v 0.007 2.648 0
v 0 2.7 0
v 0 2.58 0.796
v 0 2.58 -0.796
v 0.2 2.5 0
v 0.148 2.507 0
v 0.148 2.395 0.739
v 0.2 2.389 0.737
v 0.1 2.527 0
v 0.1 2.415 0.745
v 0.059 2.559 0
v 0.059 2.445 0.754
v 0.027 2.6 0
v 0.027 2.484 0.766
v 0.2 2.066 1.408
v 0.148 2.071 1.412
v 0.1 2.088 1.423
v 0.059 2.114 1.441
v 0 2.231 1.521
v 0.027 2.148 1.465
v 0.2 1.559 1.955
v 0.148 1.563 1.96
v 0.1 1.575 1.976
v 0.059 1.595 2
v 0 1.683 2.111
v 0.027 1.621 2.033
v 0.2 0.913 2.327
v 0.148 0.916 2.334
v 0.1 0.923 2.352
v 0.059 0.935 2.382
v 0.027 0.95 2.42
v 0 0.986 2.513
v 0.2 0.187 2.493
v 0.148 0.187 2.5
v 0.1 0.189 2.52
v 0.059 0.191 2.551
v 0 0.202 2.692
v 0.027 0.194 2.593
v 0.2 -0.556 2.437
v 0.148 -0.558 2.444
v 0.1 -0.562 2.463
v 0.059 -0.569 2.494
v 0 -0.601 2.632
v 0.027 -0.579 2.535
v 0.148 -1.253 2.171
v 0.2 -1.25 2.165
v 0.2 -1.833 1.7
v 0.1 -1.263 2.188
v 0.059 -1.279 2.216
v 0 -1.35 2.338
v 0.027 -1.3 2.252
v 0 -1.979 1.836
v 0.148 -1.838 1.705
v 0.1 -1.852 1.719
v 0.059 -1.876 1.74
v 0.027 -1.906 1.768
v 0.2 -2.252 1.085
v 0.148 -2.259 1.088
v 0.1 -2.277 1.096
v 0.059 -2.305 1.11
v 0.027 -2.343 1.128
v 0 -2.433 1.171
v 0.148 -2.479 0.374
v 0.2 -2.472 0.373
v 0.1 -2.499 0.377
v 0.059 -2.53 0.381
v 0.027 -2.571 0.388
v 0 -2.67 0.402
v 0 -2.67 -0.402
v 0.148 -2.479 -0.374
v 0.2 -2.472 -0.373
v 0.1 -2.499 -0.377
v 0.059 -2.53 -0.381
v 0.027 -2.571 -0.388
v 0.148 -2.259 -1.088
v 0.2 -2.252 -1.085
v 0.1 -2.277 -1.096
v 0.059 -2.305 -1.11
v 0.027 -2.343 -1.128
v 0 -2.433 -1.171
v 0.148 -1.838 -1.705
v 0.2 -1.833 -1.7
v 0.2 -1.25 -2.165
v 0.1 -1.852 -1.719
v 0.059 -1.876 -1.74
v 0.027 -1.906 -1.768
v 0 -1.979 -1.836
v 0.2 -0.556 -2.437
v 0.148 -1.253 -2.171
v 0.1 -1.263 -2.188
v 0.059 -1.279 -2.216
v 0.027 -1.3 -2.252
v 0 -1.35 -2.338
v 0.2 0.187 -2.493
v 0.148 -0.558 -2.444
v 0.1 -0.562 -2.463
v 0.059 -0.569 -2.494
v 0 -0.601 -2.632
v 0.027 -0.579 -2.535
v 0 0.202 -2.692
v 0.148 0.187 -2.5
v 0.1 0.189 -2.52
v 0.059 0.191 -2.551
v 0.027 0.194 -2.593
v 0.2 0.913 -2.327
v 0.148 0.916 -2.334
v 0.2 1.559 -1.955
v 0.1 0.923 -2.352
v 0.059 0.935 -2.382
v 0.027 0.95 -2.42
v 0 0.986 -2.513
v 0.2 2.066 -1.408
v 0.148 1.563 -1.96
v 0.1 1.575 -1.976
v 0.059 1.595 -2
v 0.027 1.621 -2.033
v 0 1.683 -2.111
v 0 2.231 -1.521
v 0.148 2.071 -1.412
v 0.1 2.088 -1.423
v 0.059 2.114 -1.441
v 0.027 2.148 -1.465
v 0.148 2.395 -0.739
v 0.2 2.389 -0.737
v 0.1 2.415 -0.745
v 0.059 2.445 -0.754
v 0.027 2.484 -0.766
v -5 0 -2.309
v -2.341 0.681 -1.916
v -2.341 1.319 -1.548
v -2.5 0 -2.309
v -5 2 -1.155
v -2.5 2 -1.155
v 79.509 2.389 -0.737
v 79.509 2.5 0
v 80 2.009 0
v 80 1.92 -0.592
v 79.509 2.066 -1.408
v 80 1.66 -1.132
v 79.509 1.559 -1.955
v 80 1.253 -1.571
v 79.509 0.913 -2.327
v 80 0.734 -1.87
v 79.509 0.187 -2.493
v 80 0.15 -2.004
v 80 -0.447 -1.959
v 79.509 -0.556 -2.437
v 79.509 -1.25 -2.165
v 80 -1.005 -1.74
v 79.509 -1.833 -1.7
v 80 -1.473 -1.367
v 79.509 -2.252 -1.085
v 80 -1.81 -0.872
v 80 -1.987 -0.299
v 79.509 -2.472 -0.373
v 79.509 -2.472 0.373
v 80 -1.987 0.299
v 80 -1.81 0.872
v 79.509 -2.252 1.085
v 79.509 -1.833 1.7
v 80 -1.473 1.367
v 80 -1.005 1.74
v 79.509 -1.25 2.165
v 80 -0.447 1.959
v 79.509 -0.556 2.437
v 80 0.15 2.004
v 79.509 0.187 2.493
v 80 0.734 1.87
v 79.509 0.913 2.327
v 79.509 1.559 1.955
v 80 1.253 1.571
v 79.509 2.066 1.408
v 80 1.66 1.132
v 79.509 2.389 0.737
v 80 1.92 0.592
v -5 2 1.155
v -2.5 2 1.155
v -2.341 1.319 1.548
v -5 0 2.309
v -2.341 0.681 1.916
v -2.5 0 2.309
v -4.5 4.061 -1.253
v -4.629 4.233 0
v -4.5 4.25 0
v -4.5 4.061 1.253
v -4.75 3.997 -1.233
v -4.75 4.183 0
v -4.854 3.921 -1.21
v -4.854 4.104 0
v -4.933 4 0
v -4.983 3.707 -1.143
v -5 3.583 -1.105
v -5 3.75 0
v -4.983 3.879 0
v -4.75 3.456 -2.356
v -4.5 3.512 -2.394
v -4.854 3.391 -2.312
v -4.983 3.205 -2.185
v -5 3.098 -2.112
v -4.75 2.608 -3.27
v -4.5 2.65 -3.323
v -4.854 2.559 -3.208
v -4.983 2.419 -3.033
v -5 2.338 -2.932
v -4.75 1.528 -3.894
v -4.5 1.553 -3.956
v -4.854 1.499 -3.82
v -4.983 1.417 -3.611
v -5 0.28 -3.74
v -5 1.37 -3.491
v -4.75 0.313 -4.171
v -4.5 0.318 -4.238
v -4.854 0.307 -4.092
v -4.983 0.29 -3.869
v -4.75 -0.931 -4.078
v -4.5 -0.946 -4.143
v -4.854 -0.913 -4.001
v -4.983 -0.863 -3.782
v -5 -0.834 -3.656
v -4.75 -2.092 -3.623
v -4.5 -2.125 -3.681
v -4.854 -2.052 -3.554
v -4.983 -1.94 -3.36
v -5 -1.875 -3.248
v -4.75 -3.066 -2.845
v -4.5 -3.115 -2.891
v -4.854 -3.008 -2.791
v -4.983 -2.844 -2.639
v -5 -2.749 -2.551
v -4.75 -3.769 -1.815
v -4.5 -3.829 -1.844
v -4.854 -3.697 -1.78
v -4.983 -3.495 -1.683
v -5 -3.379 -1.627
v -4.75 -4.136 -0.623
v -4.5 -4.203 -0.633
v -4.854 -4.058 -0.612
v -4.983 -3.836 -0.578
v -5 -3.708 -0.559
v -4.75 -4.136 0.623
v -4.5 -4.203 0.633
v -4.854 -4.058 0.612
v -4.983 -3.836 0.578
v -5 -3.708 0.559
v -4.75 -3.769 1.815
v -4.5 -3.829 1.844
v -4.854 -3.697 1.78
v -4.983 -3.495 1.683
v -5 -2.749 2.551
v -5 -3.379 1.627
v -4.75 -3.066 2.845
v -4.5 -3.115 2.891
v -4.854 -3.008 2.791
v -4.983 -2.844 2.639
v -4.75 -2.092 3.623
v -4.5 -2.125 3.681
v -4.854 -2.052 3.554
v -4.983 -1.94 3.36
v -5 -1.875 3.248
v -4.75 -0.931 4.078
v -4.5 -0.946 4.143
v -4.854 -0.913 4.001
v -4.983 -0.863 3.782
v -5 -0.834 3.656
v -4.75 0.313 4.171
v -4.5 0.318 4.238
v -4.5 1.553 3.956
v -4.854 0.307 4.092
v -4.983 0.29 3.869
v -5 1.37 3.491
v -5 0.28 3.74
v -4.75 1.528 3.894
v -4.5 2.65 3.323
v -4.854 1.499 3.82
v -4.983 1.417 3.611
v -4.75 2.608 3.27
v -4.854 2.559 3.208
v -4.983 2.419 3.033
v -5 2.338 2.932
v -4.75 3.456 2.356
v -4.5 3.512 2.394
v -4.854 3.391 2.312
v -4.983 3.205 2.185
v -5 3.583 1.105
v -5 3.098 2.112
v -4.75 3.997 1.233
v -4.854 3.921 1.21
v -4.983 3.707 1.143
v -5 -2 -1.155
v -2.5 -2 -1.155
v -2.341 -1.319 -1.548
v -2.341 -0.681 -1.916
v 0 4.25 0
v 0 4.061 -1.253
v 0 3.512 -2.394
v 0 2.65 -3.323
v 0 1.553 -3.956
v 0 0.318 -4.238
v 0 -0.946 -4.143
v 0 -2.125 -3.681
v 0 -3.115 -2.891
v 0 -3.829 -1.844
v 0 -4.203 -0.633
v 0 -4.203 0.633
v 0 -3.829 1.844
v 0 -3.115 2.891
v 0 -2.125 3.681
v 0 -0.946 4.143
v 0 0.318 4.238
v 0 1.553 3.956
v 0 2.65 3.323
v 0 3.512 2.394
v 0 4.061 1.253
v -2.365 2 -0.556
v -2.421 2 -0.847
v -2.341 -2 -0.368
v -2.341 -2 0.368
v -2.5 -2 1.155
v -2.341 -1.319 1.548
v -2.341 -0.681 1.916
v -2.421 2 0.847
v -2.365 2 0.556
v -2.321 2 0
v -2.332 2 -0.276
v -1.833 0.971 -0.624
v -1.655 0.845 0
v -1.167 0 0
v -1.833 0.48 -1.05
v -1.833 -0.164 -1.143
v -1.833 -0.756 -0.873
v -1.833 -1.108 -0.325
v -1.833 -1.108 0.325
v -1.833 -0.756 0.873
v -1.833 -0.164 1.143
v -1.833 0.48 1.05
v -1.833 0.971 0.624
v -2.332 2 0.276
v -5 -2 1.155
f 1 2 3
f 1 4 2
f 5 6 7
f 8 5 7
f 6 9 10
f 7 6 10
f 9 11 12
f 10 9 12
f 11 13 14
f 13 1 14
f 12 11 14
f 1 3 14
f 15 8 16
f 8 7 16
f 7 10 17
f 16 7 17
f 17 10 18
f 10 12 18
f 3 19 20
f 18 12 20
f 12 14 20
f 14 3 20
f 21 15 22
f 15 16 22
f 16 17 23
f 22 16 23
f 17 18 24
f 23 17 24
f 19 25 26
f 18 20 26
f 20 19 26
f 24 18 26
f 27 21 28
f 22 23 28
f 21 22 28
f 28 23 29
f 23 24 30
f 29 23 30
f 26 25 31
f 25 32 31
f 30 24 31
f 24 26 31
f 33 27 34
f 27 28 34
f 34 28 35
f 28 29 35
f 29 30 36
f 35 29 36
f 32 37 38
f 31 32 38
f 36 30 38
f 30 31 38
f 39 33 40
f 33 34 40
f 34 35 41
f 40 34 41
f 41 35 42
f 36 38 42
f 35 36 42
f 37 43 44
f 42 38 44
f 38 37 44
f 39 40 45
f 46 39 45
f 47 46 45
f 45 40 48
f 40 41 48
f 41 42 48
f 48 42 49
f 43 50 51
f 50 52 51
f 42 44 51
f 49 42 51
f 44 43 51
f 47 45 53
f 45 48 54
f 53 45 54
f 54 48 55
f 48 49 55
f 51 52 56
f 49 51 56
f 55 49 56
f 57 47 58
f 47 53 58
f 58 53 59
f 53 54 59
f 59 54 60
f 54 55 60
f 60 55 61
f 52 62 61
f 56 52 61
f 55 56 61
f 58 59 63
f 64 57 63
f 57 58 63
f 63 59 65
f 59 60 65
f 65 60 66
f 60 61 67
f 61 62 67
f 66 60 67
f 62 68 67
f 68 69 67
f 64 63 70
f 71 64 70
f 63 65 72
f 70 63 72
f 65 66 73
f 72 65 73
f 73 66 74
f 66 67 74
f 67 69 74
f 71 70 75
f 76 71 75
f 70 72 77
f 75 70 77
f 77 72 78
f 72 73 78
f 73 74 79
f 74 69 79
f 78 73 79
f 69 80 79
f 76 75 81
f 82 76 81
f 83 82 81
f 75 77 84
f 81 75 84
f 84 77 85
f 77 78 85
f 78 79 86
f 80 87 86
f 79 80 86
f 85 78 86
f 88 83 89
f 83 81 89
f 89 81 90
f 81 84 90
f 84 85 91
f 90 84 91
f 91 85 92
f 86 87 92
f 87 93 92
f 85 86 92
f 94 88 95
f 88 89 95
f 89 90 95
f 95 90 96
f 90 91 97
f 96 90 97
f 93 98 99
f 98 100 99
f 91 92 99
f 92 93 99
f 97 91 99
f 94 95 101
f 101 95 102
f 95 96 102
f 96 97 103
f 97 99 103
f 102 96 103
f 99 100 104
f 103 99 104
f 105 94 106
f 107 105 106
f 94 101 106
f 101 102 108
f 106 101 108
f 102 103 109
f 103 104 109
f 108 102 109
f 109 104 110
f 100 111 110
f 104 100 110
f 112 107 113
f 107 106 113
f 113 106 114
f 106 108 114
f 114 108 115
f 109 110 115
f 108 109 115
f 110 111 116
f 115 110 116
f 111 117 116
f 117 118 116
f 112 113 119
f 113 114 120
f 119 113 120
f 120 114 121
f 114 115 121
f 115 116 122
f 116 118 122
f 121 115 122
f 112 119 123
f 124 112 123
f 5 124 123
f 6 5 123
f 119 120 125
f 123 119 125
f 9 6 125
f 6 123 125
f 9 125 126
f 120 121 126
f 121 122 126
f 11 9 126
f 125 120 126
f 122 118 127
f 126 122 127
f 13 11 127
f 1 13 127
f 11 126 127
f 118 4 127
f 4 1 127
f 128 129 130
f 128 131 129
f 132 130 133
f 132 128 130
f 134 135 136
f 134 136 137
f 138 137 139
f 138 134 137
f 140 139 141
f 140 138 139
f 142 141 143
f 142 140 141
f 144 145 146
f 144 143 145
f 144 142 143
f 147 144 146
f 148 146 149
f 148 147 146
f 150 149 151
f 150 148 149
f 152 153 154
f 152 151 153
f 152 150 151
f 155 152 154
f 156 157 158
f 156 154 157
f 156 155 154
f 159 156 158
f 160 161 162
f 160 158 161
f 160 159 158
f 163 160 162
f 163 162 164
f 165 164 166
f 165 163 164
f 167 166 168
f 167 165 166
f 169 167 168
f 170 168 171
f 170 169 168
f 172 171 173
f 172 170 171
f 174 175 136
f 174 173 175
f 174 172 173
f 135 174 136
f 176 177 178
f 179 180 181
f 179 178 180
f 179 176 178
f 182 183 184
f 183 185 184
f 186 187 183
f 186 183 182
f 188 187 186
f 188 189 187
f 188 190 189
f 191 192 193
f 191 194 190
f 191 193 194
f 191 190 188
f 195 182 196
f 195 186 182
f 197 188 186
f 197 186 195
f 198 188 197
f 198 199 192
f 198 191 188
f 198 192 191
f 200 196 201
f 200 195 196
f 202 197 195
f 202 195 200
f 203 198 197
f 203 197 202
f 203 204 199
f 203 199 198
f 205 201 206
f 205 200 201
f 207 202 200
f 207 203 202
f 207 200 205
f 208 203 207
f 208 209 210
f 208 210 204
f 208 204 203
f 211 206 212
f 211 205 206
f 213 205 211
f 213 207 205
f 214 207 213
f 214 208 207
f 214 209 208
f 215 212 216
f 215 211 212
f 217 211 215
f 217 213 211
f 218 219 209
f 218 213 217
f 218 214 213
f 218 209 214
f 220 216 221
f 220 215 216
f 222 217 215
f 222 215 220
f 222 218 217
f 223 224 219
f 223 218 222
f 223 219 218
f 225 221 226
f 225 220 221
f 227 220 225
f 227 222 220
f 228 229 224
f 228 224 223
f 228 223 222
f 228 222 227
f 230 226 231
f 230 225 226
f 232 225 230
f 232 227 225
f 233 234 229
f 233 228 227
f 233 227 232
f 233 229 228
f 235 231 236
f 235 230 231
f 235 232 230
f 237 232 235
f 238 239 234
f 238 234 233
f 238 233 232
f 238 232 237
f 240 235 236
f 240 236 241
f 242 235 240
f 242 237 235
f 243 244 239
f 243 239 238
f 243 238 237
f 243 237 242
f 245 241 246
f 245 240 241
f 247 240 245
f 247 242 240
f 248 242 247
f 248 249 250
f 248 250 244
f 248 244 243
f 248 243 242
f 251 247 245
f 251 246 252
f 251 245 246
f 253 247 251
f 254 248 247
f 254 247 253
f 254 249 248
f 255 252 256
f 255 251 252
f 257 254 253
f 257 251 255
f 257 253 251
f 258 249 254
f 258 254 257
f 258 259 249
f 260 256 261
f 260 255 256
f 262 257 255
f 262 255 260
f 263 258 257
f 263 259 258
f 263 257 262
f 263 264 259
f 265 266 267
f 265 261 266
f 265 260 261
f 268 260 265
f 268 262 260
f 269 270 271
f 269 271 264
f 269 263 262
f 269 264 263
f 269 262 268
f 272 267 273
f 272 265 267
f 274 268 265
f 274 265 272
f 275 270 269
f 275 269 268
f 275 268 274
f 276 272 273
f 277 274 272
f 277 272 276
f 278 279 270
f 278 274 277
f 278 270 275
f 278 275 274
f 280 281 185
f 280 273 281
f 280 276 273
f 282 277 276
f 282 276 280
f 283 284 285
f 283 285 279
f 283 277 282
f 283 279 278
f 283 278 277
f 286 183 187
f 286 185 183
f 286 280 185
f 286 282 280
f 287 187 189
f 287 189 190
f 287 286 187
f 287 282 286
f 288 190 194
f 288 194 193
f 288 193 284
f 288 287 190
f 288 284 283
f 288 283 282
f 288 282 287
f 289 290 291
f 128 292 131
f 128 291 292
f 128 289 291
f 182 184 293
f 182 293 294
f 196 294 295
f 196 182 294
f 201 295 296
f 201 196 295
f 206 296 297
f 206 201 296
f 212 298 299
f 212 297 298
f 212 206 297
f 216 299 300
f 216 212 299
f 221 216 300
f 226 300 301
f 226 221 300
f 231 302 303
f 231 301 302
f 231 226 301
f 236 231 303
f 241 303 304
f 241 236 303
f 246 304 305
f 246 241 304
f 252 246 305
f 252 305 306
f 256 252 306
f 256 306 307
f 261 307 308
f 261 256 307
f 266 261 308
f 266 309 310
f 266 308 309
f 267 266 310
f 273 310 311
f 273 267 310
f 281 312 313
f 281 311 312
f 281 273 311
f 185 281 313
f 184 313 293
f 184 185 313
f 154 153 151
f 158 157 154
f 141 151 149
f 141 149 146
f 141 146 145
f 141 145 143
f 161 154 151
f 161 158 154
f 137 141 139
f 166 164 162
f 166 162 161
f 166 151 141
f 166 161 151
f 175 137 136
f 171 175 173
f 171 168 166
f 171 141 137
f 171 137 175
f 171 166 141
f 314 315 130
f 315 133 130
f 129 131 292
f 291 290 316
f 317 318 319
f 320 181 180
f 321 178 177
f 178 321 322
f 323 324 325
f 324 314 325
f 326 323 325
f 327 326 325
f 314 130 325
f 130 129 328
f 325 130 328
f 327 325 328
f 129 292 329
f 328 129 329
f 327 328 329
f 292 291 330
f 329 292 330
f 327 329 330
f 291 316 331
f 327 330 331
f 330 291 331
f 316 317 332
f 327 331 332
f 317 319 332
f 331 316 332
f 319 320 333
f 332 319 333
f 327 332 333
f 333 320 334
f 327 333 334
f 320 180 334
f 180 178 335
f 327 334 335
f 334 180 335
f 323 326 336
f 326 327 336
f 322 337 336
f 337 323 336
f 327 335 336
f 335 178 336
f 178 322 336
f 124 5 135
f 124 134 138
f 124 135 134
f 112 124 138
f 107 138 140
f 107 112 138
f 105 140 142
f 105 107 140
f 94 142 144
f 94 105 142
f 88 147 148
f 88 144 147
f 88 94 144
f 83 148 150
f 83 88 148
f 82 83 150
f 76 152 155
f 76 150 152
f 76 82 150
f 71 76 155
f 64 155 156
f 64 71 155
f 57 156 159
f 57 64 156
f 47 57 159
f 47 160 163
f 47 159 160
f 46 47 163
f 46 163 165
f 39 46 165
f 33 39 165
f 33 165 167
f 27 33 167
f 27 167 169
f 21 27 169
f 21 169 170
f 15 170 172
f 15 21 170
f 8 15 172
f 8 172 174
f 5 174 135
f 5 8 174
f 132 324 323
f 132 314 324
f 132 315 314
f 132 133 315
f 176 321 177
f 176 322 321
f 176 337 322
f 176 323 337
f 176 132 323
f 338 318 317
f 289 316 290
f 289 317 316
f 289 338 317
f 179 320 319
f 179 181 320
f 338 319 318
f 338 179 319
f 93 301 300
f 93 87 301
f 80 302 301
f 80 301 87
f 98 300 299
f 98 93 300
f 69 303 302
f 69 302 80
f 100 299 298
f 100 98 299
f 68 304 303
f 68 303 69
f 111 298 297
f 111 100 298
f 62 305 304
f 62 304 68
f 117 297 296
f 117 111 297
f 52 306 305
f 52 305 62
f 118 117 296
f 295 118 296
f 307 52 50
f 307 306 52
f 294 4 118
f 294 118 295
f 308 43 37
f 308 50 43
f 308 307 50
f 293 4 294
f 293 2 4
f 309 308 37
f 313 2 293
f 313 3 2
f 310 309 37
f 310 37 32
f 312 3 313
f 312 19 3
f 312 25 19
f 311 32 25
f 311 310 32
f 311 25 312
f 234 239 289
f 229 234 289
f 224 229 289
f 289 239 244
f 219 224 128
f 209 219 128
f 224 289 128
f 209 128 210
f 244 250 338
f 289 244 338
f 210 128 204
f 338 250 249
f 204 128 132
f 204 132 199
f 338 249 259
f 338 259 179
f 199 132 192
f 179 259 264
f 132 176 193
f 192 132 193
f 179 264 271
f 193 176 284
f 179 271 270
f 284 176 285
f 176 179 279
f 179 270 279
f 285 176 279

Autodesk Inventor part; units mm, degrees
ref_plane "YZ Plane" through (0, 0, 0) normal (1, 0, 0) x (0, 1, 0)
ref_plane "XZ Plane" through (0, 0, 0) normal (0, 1, 0) x (-1, 0, 0)
sketch "Sketch1" plane through (0, 0, 0) normal (0, 0, 1) x (1, 0, 0)
  line L0 (-1.1667, 0) -> (80, 0)
  line L1 (80, 0) -> (80, 2.5)
  line L2 (80, 2.5) -> (58, 2.5)
  line L3 (58, 2.5) -> (57.5091, 2.5)
  line L4 (57.5091, 2.5) -> (0, 2.5)
  line L5 (0, 2.5) -> (0, 4.25)
  line L6 (0, 4.25) -> (-5, 4.25)
  line L7 (-5, 4.25) -> (-5, 2.3094)
  line L8 (-5, 2.3094) -> (-2.5, 2.3094)
  line L9 (-2.5, 2.3094) -> (-1.1667, 0)
  line L10 (-16, 0) -> (61, 0) projected
  line L11 (0, -0.85) -> (0, 5.1) projected
  line L12 (58, 2.5) -> (0, 2.5) construction
  dimension "d1" = 22
  dimension "d2" = 0.4909
  dimension "d3" = 5
  dimension "d4" = 2.5
  dimension "d5" = 60
  dimension "d6" = 5
  dimension "d7" = 5
  dimension "d8" = 4.6188
  dimension "d9" = 8.5
  dimension "d26" = 80
revolve "Body" add sketch "Sketch1" angle 360 about axis through (-1.1667, 0, 0) along (1, 0, 0)
sketch "Sketch2" plane through (-5, 0, 0) normal (-1, 0, 0) x (0, 0, 1)
  circle A0 centre (0, 0) radius 2.3094 projected
  line L0 (0, -5.95) -> (0, 5.95) projected
  line L1 (-5.95, 0) -> (5.95, 0) projected
  line L2 (2.3094, 0) -> (1.1547, -2)
  line L3 (1.1547, -2) -> (-1.1547, -2)
  line L4 (-1.1547, -2) -> (-2.3094, 0)
  line L5 (-2.3094, 0) -> (-1.1547, 2)
  line L6 (-1.1547, 2) -> (1.1547, 2)
  line L7 (1.1547, 2) -> (2.3094, 0)
extrude "Slot" add sketch "Sketch2" against normal up to next contours L7 A0 | A0 L2 | L6 L0 A0 | A0 L0 L3 | L0 L6 A0 | A0 L3 L0 | L4 A0 | A0 L5
fillet "Fillet1" radius 0.5 1 edges at (-5, -4.25, 0)
thread "Thread" size "M5x0.8" class "6g" standard "ISO Metric profile" length 22
chamfer "Chamfer1" distance 0.4908 distance2 0.4908 1 edges at (80, -2.5, 0) measured on face at (80, 0.2278, 0.5045)
ref_plane "Work Plane1" through (29, 0, 0) normal (0, -1, 0) x (1, 0, 0)
fillet "Fillet2" radius 0.2 1 edges at (0, -2.5, 0)
equation "\"d30\" = R"
equation "\"d17\" = RR"
equation "\"d13\" = GEL"
equation "\"d15\" = -0.5 * SPD + 0.5 * GD"
equation "\"d16\" = GUL"
equation "\"d1\" = GEL"
equation "\"d3\" = KOH"
equation "\"d4\" = INTI"
equation "\"d6\" = GD"
equation "\"d7\" = BDM"
equation "\"d8\" = 1.1547 * SW"
equation "\"d9\" = KOD"
equation "\"d26\" = NLG"
equation "\"GD\" = NND"
equation "\"NLG\" = 80"
equation "\"GEL\" = 22"
equation "\"KOD\" = 8.5"
equation "\"KOH\" = 5"
equation "\"INTI\" = 2.5"
equation "\"GAL\" = 0.61345 * PTC"
equation "\"GUL\" = 0.61345 * PTC"
equation "\"BDM\" = NND"
equation "\"SW\" = 4"
equation "\"RR\" = 0.5"
equation "\"SPD\" = NND - 1.2269 * PTC"
equation "\"R\" = 0.2"
equation "\"TOA\" = 30deg"
equation "\"GD1\" = THREADDIA - 1.2269 * PTC"
equation "\"THREADDIA\" = 5"
equation "\"FAWI\" = 45deg"
equation "\"ANG\" = 120deg"
equation "\"PTC\" = 0.8"
equation "\"NND\" = 5"
equation "\"E0\" = 1.155 * SW"
properties material "Steel, Mild"
